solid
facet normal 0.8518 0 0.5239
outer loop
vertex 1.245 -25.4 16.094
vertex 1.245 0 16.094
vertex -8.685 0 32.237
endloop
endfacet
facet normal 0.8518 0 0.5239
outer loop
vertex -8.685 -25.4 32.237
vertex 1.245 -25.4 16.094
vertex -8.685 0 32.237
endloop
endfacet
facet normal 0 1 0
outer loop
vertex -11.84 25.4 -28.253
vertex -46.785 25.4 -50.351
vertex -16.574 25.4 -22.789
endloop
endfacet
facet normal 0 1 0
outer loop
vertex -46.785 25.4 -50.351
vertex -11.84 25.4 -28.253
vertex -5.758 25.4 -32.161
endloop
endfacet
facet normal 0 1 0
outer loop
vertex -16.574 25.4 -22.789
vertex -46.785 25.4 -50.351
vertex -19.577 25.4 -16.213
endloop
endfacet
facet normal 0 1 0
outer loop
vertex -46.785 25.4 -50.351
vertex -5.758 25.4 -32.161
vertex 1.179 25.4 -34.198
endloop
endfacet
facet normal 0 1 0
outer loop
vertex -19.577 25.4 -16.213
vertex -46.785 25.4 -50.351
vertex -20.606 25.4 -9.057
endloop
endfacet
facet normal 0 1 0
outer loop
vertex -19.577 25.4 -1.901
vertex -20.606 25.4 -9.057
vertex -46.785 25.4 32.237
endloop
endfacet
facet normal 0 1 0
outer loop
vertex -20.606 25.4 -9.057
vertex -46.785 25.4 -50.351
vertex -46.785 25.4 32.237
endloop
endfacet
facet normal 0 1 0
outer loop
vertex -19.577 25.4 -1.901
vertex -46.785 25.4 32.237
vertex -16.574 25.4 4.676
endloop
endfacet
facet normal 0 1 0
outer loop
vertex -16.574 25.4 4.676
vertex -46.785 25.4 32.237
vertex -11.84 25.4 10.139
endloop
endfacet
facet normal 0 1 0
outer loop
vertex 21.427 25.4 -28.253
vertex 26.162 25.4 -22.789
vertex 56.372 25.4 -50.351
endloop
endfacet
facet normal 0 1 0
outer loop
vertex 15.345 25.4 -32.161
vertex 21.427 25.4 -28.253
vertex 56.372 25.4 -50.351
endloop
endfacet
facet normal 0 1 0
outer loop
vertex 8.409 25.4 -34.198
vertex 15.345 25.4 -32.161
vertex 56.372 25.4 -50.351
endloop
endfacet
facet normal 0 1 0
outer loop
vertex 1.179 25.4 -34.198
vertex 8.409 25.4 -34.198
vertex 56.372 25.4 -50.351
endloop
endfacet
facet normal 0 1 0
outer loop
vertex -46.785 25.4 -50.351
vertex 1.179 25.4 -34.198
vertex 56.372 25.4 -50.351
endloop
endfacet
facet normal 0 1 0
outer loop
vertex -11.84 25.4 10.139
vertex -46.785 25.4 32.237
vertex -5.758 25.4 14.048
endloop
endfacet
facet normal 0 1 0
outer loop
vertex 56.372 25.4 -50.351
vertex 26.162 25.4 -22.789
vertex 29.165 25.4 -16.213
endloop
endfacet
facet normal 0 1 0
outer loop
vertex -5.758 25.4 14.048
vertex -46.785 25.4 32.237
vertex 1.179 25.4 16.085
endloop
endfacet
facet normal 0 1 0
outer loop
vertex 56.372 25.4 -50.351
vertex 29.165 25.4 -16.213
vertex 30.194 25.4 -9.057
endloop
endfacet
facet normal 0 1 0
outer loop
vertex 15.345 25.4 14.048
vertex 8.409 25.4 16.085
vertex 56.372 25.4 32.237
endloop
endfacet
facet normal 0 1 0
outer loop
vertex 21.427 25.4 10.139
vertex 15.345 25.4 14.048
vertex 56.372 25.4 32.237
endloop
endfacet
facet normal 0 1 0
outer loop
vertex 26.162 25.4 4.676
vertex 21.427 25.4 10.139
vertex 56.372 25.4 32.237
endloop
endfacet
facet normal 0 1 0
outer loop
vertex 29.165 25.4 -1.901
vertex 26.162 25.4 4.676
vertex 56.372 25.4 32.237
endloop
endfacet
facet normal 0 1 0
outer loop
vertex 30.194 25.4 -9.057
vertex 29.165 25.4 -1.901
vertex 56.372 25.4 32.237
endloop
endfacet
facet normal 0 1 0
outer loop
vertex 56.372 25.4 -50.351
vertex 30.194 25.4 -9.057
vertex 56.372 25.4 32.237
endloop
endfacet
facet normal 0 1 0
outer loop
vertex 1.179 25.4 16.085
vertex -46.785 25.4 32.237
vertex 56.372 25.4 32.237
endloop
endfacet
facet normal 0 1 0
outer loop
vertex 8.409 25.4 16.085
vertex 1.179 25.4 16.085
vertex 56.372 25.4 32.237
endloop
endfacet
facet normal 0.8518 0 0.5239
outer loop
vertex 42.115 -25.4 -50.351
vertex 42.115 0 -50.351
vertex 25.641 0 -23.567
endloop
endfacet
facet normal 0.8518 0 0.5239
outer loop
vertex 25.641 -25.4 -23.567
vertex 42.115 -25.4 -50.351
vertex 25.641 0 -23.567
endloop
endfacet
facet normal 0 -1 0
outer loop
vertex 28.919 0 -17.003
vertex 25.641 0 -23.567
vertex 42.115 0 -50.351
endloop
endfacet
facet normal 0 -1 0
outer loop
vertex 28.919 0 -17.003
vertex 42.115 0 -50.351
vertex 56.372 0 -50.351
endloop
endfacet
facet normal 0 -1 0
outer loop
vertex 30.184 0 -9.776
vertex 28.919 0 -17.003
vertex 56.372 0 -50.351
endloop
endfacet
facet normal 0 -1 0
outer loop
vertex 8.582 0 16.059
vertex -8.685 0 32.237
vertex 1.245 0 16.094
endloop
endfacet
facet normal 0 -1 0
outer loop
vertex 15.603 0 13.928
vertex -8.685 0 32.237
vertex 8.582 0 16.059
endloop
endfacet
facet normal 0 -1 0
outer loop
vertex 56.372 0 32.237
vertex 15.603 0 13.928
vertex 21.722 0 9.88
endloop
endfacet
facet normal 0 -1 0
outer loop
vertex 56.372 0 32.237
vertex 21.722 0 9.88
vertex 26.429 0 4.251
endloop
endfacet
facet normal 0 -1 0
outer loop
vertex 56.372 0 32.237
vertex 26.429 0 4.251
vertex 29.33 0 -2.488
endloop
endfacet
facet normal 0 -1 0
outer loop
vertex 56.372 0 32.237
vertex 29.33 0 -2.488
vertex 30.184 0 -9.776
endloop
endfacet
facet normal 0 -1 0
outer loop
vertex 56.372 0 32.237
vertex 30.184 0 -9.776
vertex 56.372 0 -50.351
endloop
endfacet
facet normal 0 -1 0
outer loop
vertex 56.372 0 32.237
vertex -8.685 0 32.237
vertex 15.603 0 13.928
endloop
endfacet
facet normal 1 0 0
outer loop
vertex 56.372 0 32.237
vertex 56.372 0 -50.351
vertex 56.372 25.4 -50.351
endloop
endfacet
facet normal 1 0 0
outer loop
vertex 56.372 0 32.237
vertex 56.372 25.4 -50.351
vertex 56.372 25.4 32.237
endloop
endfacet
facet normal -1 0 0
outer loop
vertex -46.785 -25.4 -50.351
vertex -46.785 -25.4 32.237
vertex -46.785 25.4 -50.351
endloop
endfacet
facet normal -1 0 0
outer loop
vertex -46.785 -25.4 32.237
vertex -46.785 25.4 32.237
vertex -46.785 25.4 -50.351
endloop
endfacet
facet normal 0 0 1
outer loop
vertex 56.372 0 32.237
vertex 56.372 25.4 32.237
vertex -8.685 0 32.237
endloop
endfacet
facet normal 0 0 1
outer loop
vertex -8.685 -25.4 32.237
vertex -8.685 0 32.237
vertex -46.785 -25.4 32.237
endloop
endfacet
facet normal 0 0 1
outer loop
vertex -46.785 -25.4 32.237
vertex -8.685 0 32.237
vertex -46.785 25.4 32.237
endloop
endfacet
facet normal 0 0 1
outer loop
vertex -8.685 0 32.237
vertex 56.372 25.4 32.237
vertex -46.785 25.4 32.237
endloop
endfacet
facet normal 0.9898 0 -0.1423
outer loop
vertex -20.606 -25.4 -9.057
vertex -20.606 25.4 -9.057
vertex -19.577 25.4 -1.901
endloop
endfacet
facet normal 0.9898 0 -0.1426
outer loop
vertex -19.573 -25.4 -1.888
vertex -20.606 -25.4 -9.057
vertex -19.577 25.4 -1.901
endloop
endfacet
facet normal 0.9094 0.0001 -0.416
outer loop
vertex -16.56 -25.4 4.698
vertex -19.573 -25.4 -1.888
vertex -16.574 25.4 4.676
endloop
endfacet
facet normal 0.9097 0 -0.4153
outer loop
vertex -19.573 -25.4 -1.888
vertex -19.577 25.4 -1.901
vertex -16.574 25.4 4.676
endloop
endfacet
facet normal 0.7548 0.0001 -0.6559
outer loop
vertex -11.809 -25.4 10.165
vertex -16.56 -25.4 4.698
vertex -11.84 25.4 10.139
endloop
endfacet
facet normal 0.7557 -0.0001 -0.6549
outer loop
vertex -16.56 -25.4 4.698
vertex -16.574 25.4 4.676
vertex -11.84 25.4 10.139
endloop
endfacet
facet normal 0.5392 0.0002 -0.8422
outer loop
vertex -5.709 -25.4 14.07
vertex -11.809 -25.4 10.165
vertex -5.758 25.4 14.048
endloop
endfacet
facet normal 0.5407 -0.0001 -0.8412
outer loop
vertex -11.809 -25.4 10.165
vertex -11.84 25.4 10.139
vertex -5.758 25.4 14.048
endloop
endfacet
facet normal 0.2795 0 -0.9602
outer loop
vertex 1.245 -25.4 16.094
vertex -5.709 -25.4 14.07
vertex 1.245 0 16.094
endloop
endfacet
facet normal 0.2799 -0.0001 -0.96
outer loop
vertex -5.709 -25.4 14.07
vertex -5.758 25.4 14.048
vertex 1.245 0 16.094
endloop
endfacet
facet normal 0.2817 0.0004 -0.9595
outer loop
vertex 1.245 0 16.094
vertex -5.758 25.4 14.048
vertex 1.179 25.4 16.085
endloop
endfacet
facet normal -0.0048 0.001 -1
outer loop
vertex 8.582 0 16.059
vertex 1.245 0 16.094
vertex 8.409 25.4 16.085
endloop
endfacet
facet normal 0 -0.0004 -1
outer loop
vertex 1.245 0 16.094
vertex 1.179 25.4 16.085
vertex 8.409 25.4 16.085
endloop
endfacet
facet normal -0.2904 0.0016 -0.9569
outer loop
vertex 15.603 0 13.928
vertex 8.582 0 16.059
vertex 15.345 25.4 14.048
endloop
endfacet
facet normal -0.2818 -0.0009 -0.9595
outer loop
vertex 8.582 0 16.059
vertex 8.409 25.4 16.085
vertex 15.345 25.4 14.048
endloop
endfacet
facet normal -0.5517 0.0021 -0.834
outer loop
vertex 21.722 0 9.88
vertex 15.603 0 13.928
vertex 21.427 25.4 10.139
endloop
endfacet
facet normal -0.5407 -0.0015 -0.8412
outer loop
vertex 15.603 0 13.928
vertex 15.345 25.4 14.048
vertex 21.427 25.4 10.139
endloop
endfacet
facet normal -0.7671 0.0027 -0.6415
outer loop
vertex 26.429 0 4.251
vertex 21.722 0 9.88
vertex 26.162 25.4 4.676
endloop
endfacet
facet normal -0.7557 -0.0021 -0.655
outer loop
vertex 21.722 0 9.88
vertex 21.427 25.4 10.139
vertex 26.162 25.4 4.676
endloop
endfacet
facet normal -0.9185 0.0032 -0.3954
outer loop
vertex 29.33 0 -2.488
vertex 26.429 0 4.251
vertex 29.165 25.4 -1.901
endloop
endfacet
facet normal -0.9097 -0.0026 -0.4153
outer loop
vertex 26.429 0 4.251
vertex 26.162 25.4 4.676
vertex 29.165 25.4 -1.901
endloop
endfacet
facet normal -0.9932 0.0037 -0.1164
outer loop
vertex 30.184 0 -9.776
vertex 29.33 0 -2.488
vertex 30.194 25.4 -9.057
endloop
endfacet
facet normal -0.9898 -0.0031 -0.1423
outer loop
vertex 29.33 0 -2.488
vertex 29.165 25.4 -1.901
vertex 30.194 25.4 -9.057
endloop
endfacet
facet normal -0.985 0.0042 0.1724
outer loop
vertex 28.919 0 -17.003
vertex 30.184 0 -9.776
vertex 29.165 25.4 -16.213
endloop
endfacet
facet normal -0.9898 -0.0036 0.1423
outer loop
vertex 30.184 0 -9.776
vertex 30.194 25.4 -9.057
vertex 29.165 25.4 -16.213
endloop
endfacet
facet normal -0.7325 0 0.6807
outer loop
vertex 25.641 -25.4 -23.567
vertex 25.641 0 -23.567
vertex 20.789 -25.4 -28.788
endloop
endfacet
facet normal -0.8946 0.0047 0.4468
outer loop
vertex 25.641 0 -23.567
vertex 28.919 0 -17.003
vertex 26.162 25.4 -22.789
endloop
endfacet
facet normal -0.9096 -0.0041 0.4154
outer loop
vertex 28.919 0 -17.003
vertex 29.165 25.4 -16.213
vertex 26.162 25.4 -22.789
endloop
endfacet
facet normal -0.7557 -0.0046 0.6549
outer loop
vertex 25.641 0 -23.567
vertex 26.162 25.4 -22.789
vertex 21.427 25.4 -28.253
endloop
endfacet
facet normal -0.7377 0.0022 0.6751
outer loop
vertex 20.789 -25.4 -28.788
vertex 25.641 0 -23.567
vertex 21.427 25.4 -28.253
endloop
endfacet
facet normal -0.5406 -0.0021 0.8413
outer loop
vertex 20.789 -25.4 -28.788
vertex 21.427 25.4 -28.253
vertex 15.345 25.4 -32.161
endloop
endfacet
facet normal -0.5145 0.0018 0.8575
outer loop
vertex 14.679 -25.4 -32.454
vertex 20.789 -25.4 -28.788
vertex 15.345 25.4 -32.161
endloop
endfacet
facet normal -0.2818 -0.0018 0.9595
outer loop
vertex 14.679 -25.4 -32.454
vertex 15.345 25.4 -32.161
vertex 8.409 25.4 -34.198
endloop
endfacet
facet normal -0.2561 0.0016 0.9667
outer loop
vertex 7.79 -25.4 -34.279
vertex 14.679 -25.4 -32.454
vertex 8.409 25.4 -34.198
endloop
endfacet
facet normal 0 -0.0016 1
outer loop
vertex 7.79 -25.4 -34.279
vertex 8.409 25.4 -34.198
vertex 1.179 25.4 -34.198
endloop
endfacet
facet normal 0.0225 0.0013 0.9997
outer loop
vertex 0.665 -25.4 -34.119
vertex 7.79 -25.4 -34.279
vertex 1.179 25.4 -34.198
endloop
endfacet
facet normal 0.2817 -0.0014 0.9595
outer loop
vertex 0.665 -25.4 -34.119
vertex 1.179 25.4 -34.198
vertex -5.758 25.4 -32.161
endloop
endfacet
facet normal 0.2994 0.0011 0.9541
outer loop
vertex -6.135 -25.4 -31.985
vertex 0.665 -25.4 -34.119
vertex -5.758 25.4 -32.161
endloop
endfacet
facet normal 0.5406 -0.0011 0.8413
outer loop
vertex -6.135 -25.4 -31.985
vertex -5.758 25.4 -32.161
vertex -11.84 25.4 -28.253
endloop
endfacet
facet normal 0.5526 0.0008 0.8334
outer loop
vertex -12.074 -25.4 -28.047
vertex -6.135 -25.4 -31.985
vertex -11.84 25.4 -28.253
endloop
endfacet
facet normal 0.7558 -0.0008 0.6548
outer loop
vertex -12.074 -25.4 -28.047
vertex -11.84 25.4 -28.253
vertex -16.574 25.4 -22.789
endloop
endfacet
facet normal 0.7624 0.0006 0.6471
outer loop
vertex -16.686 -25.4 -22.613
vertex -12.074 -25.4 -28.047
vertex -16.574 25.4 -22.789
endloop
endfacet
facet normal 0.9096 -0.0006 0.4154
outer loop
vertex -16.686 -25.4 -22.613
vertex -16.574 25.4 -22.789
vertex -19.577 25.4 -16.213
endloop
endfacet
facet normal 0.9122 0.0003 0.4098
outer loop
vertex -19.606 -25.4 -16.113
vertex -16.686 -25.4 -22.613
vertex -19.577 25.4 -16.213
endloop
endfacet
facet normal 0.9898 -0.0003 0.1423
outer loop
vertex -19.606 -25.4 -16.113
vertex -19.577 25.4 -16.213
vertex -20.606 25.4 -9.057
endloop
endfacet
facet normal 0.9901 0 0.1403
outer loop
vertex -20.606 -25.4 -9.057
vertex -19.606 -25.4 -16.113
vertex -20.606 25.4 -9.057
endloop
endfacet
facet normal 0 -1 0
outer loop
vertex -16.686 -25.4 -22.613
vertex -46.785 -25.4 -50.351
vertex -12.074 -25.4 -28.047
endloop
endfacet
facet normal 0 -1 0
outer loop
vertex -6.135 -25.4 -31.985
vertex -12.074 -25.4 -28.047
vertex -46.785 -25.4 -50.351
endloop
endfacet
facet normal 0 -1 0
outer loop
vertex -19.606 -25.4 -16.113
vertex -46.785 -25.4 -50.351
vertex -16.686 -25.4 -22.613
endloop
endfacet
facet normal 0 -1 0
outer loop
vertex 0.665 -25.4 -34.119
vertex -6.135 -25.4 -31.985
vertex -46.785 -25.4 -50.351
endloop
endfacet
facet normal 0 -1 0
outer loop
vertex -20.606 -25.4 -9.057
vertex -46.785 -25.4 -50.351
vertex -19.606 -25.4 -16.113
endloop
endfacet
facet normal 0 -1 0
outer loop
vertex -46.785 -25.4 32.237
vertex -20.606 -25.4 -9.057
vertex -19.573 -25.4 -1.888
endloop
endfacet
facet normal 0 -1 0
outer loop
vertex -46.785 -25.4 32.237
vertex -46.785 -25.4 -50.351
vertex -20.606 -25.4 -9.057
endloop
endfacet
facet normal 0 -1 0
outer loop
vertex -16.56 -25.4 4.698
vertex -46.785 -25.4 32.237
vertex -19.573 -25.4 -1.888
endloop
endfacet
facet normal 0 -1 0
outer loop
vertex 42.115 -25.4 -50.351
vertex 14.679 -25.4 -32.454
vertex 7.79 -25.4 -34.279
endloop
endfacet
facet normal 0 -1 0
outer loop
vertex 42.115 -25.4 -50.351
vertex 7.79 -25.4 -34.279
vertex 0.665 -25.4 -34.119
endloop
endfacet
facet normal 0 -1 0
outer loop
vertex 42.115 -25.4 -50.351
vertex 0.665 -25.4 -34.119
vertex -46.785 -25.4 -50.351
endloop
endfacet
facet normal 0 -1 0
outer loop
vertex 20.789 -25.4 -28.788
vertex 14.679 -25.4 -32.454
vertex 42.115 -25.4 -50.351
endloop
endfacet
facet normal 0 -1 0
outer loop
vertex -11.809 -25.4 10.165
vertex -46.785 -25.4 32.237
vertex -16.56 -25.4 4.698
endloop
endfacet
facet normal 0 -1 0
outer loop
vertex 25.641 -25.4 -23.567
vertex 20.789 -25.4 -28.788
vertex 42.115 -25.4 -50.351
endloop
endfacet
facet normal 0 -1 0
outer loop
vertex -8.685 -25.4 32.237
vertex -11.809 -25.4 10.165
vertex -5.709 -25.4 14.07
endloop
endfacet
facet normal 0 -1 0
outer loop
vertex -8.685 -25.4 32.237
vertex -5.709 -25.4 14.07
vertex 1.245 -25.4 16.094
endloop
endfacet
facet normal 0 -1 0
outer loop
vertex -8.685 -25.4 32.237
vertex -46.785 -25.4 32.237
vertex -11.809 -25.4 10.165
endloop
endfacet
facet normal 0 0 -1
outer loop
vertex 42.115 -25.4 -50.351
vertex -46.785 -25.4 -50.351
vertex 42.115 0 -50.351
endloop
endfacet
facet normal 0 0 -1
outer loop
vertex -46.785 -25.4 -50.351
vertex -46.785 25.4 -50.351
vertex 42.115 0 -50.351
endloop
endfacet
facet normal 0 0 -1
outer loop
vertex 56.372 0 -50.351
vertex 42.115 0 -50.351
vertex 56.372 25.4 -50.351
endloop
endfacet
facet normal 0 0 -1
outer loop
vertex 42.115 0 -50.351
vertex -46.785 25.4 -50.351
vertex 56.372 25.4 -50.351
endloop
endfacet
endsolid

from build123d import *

# Parameters (mm, degrees)
F0_W     = 103.156984
F0_H     = 82.587916
F1_DEPTH = 25.4
F3_DEPTH = 25.4
F4_R     = 25.4
F5_DEPTH = 127


with BuildPart() as f1:
    # F0 (on Front) → F1 (new body)
    with BuildSketch(Plane.XZ):
        with Locations((4.793879, -9.056745)):
            Rectangle(F0_W, F0_H)
    extrude(amount=-F1_DEPTH)

    # F2 (on face) → F3 (join)
    with BuildSketch(Plane.XZ):
        Polygon((-8.684613, 32.237213), (-46.784613, 32.237213), (-46.784613, -50.350703), (42.115387, -50.350703), align=None)
    extrude(amount=F3_DEPTH)

    # F4 (on face) → F5 (cut)
    with BuildSketch(Plane(origin=(0, 25.4, 0), x_dir=(-1, 0, 0), z_dir=(0, 1, 0))):
        with Locations((-4.793879, -9.056745)):
            Circle(F4_R)
    extrude(amount=-F5_DEPTH, mode=Mode.SUBTRACT)


solid = f1.part
